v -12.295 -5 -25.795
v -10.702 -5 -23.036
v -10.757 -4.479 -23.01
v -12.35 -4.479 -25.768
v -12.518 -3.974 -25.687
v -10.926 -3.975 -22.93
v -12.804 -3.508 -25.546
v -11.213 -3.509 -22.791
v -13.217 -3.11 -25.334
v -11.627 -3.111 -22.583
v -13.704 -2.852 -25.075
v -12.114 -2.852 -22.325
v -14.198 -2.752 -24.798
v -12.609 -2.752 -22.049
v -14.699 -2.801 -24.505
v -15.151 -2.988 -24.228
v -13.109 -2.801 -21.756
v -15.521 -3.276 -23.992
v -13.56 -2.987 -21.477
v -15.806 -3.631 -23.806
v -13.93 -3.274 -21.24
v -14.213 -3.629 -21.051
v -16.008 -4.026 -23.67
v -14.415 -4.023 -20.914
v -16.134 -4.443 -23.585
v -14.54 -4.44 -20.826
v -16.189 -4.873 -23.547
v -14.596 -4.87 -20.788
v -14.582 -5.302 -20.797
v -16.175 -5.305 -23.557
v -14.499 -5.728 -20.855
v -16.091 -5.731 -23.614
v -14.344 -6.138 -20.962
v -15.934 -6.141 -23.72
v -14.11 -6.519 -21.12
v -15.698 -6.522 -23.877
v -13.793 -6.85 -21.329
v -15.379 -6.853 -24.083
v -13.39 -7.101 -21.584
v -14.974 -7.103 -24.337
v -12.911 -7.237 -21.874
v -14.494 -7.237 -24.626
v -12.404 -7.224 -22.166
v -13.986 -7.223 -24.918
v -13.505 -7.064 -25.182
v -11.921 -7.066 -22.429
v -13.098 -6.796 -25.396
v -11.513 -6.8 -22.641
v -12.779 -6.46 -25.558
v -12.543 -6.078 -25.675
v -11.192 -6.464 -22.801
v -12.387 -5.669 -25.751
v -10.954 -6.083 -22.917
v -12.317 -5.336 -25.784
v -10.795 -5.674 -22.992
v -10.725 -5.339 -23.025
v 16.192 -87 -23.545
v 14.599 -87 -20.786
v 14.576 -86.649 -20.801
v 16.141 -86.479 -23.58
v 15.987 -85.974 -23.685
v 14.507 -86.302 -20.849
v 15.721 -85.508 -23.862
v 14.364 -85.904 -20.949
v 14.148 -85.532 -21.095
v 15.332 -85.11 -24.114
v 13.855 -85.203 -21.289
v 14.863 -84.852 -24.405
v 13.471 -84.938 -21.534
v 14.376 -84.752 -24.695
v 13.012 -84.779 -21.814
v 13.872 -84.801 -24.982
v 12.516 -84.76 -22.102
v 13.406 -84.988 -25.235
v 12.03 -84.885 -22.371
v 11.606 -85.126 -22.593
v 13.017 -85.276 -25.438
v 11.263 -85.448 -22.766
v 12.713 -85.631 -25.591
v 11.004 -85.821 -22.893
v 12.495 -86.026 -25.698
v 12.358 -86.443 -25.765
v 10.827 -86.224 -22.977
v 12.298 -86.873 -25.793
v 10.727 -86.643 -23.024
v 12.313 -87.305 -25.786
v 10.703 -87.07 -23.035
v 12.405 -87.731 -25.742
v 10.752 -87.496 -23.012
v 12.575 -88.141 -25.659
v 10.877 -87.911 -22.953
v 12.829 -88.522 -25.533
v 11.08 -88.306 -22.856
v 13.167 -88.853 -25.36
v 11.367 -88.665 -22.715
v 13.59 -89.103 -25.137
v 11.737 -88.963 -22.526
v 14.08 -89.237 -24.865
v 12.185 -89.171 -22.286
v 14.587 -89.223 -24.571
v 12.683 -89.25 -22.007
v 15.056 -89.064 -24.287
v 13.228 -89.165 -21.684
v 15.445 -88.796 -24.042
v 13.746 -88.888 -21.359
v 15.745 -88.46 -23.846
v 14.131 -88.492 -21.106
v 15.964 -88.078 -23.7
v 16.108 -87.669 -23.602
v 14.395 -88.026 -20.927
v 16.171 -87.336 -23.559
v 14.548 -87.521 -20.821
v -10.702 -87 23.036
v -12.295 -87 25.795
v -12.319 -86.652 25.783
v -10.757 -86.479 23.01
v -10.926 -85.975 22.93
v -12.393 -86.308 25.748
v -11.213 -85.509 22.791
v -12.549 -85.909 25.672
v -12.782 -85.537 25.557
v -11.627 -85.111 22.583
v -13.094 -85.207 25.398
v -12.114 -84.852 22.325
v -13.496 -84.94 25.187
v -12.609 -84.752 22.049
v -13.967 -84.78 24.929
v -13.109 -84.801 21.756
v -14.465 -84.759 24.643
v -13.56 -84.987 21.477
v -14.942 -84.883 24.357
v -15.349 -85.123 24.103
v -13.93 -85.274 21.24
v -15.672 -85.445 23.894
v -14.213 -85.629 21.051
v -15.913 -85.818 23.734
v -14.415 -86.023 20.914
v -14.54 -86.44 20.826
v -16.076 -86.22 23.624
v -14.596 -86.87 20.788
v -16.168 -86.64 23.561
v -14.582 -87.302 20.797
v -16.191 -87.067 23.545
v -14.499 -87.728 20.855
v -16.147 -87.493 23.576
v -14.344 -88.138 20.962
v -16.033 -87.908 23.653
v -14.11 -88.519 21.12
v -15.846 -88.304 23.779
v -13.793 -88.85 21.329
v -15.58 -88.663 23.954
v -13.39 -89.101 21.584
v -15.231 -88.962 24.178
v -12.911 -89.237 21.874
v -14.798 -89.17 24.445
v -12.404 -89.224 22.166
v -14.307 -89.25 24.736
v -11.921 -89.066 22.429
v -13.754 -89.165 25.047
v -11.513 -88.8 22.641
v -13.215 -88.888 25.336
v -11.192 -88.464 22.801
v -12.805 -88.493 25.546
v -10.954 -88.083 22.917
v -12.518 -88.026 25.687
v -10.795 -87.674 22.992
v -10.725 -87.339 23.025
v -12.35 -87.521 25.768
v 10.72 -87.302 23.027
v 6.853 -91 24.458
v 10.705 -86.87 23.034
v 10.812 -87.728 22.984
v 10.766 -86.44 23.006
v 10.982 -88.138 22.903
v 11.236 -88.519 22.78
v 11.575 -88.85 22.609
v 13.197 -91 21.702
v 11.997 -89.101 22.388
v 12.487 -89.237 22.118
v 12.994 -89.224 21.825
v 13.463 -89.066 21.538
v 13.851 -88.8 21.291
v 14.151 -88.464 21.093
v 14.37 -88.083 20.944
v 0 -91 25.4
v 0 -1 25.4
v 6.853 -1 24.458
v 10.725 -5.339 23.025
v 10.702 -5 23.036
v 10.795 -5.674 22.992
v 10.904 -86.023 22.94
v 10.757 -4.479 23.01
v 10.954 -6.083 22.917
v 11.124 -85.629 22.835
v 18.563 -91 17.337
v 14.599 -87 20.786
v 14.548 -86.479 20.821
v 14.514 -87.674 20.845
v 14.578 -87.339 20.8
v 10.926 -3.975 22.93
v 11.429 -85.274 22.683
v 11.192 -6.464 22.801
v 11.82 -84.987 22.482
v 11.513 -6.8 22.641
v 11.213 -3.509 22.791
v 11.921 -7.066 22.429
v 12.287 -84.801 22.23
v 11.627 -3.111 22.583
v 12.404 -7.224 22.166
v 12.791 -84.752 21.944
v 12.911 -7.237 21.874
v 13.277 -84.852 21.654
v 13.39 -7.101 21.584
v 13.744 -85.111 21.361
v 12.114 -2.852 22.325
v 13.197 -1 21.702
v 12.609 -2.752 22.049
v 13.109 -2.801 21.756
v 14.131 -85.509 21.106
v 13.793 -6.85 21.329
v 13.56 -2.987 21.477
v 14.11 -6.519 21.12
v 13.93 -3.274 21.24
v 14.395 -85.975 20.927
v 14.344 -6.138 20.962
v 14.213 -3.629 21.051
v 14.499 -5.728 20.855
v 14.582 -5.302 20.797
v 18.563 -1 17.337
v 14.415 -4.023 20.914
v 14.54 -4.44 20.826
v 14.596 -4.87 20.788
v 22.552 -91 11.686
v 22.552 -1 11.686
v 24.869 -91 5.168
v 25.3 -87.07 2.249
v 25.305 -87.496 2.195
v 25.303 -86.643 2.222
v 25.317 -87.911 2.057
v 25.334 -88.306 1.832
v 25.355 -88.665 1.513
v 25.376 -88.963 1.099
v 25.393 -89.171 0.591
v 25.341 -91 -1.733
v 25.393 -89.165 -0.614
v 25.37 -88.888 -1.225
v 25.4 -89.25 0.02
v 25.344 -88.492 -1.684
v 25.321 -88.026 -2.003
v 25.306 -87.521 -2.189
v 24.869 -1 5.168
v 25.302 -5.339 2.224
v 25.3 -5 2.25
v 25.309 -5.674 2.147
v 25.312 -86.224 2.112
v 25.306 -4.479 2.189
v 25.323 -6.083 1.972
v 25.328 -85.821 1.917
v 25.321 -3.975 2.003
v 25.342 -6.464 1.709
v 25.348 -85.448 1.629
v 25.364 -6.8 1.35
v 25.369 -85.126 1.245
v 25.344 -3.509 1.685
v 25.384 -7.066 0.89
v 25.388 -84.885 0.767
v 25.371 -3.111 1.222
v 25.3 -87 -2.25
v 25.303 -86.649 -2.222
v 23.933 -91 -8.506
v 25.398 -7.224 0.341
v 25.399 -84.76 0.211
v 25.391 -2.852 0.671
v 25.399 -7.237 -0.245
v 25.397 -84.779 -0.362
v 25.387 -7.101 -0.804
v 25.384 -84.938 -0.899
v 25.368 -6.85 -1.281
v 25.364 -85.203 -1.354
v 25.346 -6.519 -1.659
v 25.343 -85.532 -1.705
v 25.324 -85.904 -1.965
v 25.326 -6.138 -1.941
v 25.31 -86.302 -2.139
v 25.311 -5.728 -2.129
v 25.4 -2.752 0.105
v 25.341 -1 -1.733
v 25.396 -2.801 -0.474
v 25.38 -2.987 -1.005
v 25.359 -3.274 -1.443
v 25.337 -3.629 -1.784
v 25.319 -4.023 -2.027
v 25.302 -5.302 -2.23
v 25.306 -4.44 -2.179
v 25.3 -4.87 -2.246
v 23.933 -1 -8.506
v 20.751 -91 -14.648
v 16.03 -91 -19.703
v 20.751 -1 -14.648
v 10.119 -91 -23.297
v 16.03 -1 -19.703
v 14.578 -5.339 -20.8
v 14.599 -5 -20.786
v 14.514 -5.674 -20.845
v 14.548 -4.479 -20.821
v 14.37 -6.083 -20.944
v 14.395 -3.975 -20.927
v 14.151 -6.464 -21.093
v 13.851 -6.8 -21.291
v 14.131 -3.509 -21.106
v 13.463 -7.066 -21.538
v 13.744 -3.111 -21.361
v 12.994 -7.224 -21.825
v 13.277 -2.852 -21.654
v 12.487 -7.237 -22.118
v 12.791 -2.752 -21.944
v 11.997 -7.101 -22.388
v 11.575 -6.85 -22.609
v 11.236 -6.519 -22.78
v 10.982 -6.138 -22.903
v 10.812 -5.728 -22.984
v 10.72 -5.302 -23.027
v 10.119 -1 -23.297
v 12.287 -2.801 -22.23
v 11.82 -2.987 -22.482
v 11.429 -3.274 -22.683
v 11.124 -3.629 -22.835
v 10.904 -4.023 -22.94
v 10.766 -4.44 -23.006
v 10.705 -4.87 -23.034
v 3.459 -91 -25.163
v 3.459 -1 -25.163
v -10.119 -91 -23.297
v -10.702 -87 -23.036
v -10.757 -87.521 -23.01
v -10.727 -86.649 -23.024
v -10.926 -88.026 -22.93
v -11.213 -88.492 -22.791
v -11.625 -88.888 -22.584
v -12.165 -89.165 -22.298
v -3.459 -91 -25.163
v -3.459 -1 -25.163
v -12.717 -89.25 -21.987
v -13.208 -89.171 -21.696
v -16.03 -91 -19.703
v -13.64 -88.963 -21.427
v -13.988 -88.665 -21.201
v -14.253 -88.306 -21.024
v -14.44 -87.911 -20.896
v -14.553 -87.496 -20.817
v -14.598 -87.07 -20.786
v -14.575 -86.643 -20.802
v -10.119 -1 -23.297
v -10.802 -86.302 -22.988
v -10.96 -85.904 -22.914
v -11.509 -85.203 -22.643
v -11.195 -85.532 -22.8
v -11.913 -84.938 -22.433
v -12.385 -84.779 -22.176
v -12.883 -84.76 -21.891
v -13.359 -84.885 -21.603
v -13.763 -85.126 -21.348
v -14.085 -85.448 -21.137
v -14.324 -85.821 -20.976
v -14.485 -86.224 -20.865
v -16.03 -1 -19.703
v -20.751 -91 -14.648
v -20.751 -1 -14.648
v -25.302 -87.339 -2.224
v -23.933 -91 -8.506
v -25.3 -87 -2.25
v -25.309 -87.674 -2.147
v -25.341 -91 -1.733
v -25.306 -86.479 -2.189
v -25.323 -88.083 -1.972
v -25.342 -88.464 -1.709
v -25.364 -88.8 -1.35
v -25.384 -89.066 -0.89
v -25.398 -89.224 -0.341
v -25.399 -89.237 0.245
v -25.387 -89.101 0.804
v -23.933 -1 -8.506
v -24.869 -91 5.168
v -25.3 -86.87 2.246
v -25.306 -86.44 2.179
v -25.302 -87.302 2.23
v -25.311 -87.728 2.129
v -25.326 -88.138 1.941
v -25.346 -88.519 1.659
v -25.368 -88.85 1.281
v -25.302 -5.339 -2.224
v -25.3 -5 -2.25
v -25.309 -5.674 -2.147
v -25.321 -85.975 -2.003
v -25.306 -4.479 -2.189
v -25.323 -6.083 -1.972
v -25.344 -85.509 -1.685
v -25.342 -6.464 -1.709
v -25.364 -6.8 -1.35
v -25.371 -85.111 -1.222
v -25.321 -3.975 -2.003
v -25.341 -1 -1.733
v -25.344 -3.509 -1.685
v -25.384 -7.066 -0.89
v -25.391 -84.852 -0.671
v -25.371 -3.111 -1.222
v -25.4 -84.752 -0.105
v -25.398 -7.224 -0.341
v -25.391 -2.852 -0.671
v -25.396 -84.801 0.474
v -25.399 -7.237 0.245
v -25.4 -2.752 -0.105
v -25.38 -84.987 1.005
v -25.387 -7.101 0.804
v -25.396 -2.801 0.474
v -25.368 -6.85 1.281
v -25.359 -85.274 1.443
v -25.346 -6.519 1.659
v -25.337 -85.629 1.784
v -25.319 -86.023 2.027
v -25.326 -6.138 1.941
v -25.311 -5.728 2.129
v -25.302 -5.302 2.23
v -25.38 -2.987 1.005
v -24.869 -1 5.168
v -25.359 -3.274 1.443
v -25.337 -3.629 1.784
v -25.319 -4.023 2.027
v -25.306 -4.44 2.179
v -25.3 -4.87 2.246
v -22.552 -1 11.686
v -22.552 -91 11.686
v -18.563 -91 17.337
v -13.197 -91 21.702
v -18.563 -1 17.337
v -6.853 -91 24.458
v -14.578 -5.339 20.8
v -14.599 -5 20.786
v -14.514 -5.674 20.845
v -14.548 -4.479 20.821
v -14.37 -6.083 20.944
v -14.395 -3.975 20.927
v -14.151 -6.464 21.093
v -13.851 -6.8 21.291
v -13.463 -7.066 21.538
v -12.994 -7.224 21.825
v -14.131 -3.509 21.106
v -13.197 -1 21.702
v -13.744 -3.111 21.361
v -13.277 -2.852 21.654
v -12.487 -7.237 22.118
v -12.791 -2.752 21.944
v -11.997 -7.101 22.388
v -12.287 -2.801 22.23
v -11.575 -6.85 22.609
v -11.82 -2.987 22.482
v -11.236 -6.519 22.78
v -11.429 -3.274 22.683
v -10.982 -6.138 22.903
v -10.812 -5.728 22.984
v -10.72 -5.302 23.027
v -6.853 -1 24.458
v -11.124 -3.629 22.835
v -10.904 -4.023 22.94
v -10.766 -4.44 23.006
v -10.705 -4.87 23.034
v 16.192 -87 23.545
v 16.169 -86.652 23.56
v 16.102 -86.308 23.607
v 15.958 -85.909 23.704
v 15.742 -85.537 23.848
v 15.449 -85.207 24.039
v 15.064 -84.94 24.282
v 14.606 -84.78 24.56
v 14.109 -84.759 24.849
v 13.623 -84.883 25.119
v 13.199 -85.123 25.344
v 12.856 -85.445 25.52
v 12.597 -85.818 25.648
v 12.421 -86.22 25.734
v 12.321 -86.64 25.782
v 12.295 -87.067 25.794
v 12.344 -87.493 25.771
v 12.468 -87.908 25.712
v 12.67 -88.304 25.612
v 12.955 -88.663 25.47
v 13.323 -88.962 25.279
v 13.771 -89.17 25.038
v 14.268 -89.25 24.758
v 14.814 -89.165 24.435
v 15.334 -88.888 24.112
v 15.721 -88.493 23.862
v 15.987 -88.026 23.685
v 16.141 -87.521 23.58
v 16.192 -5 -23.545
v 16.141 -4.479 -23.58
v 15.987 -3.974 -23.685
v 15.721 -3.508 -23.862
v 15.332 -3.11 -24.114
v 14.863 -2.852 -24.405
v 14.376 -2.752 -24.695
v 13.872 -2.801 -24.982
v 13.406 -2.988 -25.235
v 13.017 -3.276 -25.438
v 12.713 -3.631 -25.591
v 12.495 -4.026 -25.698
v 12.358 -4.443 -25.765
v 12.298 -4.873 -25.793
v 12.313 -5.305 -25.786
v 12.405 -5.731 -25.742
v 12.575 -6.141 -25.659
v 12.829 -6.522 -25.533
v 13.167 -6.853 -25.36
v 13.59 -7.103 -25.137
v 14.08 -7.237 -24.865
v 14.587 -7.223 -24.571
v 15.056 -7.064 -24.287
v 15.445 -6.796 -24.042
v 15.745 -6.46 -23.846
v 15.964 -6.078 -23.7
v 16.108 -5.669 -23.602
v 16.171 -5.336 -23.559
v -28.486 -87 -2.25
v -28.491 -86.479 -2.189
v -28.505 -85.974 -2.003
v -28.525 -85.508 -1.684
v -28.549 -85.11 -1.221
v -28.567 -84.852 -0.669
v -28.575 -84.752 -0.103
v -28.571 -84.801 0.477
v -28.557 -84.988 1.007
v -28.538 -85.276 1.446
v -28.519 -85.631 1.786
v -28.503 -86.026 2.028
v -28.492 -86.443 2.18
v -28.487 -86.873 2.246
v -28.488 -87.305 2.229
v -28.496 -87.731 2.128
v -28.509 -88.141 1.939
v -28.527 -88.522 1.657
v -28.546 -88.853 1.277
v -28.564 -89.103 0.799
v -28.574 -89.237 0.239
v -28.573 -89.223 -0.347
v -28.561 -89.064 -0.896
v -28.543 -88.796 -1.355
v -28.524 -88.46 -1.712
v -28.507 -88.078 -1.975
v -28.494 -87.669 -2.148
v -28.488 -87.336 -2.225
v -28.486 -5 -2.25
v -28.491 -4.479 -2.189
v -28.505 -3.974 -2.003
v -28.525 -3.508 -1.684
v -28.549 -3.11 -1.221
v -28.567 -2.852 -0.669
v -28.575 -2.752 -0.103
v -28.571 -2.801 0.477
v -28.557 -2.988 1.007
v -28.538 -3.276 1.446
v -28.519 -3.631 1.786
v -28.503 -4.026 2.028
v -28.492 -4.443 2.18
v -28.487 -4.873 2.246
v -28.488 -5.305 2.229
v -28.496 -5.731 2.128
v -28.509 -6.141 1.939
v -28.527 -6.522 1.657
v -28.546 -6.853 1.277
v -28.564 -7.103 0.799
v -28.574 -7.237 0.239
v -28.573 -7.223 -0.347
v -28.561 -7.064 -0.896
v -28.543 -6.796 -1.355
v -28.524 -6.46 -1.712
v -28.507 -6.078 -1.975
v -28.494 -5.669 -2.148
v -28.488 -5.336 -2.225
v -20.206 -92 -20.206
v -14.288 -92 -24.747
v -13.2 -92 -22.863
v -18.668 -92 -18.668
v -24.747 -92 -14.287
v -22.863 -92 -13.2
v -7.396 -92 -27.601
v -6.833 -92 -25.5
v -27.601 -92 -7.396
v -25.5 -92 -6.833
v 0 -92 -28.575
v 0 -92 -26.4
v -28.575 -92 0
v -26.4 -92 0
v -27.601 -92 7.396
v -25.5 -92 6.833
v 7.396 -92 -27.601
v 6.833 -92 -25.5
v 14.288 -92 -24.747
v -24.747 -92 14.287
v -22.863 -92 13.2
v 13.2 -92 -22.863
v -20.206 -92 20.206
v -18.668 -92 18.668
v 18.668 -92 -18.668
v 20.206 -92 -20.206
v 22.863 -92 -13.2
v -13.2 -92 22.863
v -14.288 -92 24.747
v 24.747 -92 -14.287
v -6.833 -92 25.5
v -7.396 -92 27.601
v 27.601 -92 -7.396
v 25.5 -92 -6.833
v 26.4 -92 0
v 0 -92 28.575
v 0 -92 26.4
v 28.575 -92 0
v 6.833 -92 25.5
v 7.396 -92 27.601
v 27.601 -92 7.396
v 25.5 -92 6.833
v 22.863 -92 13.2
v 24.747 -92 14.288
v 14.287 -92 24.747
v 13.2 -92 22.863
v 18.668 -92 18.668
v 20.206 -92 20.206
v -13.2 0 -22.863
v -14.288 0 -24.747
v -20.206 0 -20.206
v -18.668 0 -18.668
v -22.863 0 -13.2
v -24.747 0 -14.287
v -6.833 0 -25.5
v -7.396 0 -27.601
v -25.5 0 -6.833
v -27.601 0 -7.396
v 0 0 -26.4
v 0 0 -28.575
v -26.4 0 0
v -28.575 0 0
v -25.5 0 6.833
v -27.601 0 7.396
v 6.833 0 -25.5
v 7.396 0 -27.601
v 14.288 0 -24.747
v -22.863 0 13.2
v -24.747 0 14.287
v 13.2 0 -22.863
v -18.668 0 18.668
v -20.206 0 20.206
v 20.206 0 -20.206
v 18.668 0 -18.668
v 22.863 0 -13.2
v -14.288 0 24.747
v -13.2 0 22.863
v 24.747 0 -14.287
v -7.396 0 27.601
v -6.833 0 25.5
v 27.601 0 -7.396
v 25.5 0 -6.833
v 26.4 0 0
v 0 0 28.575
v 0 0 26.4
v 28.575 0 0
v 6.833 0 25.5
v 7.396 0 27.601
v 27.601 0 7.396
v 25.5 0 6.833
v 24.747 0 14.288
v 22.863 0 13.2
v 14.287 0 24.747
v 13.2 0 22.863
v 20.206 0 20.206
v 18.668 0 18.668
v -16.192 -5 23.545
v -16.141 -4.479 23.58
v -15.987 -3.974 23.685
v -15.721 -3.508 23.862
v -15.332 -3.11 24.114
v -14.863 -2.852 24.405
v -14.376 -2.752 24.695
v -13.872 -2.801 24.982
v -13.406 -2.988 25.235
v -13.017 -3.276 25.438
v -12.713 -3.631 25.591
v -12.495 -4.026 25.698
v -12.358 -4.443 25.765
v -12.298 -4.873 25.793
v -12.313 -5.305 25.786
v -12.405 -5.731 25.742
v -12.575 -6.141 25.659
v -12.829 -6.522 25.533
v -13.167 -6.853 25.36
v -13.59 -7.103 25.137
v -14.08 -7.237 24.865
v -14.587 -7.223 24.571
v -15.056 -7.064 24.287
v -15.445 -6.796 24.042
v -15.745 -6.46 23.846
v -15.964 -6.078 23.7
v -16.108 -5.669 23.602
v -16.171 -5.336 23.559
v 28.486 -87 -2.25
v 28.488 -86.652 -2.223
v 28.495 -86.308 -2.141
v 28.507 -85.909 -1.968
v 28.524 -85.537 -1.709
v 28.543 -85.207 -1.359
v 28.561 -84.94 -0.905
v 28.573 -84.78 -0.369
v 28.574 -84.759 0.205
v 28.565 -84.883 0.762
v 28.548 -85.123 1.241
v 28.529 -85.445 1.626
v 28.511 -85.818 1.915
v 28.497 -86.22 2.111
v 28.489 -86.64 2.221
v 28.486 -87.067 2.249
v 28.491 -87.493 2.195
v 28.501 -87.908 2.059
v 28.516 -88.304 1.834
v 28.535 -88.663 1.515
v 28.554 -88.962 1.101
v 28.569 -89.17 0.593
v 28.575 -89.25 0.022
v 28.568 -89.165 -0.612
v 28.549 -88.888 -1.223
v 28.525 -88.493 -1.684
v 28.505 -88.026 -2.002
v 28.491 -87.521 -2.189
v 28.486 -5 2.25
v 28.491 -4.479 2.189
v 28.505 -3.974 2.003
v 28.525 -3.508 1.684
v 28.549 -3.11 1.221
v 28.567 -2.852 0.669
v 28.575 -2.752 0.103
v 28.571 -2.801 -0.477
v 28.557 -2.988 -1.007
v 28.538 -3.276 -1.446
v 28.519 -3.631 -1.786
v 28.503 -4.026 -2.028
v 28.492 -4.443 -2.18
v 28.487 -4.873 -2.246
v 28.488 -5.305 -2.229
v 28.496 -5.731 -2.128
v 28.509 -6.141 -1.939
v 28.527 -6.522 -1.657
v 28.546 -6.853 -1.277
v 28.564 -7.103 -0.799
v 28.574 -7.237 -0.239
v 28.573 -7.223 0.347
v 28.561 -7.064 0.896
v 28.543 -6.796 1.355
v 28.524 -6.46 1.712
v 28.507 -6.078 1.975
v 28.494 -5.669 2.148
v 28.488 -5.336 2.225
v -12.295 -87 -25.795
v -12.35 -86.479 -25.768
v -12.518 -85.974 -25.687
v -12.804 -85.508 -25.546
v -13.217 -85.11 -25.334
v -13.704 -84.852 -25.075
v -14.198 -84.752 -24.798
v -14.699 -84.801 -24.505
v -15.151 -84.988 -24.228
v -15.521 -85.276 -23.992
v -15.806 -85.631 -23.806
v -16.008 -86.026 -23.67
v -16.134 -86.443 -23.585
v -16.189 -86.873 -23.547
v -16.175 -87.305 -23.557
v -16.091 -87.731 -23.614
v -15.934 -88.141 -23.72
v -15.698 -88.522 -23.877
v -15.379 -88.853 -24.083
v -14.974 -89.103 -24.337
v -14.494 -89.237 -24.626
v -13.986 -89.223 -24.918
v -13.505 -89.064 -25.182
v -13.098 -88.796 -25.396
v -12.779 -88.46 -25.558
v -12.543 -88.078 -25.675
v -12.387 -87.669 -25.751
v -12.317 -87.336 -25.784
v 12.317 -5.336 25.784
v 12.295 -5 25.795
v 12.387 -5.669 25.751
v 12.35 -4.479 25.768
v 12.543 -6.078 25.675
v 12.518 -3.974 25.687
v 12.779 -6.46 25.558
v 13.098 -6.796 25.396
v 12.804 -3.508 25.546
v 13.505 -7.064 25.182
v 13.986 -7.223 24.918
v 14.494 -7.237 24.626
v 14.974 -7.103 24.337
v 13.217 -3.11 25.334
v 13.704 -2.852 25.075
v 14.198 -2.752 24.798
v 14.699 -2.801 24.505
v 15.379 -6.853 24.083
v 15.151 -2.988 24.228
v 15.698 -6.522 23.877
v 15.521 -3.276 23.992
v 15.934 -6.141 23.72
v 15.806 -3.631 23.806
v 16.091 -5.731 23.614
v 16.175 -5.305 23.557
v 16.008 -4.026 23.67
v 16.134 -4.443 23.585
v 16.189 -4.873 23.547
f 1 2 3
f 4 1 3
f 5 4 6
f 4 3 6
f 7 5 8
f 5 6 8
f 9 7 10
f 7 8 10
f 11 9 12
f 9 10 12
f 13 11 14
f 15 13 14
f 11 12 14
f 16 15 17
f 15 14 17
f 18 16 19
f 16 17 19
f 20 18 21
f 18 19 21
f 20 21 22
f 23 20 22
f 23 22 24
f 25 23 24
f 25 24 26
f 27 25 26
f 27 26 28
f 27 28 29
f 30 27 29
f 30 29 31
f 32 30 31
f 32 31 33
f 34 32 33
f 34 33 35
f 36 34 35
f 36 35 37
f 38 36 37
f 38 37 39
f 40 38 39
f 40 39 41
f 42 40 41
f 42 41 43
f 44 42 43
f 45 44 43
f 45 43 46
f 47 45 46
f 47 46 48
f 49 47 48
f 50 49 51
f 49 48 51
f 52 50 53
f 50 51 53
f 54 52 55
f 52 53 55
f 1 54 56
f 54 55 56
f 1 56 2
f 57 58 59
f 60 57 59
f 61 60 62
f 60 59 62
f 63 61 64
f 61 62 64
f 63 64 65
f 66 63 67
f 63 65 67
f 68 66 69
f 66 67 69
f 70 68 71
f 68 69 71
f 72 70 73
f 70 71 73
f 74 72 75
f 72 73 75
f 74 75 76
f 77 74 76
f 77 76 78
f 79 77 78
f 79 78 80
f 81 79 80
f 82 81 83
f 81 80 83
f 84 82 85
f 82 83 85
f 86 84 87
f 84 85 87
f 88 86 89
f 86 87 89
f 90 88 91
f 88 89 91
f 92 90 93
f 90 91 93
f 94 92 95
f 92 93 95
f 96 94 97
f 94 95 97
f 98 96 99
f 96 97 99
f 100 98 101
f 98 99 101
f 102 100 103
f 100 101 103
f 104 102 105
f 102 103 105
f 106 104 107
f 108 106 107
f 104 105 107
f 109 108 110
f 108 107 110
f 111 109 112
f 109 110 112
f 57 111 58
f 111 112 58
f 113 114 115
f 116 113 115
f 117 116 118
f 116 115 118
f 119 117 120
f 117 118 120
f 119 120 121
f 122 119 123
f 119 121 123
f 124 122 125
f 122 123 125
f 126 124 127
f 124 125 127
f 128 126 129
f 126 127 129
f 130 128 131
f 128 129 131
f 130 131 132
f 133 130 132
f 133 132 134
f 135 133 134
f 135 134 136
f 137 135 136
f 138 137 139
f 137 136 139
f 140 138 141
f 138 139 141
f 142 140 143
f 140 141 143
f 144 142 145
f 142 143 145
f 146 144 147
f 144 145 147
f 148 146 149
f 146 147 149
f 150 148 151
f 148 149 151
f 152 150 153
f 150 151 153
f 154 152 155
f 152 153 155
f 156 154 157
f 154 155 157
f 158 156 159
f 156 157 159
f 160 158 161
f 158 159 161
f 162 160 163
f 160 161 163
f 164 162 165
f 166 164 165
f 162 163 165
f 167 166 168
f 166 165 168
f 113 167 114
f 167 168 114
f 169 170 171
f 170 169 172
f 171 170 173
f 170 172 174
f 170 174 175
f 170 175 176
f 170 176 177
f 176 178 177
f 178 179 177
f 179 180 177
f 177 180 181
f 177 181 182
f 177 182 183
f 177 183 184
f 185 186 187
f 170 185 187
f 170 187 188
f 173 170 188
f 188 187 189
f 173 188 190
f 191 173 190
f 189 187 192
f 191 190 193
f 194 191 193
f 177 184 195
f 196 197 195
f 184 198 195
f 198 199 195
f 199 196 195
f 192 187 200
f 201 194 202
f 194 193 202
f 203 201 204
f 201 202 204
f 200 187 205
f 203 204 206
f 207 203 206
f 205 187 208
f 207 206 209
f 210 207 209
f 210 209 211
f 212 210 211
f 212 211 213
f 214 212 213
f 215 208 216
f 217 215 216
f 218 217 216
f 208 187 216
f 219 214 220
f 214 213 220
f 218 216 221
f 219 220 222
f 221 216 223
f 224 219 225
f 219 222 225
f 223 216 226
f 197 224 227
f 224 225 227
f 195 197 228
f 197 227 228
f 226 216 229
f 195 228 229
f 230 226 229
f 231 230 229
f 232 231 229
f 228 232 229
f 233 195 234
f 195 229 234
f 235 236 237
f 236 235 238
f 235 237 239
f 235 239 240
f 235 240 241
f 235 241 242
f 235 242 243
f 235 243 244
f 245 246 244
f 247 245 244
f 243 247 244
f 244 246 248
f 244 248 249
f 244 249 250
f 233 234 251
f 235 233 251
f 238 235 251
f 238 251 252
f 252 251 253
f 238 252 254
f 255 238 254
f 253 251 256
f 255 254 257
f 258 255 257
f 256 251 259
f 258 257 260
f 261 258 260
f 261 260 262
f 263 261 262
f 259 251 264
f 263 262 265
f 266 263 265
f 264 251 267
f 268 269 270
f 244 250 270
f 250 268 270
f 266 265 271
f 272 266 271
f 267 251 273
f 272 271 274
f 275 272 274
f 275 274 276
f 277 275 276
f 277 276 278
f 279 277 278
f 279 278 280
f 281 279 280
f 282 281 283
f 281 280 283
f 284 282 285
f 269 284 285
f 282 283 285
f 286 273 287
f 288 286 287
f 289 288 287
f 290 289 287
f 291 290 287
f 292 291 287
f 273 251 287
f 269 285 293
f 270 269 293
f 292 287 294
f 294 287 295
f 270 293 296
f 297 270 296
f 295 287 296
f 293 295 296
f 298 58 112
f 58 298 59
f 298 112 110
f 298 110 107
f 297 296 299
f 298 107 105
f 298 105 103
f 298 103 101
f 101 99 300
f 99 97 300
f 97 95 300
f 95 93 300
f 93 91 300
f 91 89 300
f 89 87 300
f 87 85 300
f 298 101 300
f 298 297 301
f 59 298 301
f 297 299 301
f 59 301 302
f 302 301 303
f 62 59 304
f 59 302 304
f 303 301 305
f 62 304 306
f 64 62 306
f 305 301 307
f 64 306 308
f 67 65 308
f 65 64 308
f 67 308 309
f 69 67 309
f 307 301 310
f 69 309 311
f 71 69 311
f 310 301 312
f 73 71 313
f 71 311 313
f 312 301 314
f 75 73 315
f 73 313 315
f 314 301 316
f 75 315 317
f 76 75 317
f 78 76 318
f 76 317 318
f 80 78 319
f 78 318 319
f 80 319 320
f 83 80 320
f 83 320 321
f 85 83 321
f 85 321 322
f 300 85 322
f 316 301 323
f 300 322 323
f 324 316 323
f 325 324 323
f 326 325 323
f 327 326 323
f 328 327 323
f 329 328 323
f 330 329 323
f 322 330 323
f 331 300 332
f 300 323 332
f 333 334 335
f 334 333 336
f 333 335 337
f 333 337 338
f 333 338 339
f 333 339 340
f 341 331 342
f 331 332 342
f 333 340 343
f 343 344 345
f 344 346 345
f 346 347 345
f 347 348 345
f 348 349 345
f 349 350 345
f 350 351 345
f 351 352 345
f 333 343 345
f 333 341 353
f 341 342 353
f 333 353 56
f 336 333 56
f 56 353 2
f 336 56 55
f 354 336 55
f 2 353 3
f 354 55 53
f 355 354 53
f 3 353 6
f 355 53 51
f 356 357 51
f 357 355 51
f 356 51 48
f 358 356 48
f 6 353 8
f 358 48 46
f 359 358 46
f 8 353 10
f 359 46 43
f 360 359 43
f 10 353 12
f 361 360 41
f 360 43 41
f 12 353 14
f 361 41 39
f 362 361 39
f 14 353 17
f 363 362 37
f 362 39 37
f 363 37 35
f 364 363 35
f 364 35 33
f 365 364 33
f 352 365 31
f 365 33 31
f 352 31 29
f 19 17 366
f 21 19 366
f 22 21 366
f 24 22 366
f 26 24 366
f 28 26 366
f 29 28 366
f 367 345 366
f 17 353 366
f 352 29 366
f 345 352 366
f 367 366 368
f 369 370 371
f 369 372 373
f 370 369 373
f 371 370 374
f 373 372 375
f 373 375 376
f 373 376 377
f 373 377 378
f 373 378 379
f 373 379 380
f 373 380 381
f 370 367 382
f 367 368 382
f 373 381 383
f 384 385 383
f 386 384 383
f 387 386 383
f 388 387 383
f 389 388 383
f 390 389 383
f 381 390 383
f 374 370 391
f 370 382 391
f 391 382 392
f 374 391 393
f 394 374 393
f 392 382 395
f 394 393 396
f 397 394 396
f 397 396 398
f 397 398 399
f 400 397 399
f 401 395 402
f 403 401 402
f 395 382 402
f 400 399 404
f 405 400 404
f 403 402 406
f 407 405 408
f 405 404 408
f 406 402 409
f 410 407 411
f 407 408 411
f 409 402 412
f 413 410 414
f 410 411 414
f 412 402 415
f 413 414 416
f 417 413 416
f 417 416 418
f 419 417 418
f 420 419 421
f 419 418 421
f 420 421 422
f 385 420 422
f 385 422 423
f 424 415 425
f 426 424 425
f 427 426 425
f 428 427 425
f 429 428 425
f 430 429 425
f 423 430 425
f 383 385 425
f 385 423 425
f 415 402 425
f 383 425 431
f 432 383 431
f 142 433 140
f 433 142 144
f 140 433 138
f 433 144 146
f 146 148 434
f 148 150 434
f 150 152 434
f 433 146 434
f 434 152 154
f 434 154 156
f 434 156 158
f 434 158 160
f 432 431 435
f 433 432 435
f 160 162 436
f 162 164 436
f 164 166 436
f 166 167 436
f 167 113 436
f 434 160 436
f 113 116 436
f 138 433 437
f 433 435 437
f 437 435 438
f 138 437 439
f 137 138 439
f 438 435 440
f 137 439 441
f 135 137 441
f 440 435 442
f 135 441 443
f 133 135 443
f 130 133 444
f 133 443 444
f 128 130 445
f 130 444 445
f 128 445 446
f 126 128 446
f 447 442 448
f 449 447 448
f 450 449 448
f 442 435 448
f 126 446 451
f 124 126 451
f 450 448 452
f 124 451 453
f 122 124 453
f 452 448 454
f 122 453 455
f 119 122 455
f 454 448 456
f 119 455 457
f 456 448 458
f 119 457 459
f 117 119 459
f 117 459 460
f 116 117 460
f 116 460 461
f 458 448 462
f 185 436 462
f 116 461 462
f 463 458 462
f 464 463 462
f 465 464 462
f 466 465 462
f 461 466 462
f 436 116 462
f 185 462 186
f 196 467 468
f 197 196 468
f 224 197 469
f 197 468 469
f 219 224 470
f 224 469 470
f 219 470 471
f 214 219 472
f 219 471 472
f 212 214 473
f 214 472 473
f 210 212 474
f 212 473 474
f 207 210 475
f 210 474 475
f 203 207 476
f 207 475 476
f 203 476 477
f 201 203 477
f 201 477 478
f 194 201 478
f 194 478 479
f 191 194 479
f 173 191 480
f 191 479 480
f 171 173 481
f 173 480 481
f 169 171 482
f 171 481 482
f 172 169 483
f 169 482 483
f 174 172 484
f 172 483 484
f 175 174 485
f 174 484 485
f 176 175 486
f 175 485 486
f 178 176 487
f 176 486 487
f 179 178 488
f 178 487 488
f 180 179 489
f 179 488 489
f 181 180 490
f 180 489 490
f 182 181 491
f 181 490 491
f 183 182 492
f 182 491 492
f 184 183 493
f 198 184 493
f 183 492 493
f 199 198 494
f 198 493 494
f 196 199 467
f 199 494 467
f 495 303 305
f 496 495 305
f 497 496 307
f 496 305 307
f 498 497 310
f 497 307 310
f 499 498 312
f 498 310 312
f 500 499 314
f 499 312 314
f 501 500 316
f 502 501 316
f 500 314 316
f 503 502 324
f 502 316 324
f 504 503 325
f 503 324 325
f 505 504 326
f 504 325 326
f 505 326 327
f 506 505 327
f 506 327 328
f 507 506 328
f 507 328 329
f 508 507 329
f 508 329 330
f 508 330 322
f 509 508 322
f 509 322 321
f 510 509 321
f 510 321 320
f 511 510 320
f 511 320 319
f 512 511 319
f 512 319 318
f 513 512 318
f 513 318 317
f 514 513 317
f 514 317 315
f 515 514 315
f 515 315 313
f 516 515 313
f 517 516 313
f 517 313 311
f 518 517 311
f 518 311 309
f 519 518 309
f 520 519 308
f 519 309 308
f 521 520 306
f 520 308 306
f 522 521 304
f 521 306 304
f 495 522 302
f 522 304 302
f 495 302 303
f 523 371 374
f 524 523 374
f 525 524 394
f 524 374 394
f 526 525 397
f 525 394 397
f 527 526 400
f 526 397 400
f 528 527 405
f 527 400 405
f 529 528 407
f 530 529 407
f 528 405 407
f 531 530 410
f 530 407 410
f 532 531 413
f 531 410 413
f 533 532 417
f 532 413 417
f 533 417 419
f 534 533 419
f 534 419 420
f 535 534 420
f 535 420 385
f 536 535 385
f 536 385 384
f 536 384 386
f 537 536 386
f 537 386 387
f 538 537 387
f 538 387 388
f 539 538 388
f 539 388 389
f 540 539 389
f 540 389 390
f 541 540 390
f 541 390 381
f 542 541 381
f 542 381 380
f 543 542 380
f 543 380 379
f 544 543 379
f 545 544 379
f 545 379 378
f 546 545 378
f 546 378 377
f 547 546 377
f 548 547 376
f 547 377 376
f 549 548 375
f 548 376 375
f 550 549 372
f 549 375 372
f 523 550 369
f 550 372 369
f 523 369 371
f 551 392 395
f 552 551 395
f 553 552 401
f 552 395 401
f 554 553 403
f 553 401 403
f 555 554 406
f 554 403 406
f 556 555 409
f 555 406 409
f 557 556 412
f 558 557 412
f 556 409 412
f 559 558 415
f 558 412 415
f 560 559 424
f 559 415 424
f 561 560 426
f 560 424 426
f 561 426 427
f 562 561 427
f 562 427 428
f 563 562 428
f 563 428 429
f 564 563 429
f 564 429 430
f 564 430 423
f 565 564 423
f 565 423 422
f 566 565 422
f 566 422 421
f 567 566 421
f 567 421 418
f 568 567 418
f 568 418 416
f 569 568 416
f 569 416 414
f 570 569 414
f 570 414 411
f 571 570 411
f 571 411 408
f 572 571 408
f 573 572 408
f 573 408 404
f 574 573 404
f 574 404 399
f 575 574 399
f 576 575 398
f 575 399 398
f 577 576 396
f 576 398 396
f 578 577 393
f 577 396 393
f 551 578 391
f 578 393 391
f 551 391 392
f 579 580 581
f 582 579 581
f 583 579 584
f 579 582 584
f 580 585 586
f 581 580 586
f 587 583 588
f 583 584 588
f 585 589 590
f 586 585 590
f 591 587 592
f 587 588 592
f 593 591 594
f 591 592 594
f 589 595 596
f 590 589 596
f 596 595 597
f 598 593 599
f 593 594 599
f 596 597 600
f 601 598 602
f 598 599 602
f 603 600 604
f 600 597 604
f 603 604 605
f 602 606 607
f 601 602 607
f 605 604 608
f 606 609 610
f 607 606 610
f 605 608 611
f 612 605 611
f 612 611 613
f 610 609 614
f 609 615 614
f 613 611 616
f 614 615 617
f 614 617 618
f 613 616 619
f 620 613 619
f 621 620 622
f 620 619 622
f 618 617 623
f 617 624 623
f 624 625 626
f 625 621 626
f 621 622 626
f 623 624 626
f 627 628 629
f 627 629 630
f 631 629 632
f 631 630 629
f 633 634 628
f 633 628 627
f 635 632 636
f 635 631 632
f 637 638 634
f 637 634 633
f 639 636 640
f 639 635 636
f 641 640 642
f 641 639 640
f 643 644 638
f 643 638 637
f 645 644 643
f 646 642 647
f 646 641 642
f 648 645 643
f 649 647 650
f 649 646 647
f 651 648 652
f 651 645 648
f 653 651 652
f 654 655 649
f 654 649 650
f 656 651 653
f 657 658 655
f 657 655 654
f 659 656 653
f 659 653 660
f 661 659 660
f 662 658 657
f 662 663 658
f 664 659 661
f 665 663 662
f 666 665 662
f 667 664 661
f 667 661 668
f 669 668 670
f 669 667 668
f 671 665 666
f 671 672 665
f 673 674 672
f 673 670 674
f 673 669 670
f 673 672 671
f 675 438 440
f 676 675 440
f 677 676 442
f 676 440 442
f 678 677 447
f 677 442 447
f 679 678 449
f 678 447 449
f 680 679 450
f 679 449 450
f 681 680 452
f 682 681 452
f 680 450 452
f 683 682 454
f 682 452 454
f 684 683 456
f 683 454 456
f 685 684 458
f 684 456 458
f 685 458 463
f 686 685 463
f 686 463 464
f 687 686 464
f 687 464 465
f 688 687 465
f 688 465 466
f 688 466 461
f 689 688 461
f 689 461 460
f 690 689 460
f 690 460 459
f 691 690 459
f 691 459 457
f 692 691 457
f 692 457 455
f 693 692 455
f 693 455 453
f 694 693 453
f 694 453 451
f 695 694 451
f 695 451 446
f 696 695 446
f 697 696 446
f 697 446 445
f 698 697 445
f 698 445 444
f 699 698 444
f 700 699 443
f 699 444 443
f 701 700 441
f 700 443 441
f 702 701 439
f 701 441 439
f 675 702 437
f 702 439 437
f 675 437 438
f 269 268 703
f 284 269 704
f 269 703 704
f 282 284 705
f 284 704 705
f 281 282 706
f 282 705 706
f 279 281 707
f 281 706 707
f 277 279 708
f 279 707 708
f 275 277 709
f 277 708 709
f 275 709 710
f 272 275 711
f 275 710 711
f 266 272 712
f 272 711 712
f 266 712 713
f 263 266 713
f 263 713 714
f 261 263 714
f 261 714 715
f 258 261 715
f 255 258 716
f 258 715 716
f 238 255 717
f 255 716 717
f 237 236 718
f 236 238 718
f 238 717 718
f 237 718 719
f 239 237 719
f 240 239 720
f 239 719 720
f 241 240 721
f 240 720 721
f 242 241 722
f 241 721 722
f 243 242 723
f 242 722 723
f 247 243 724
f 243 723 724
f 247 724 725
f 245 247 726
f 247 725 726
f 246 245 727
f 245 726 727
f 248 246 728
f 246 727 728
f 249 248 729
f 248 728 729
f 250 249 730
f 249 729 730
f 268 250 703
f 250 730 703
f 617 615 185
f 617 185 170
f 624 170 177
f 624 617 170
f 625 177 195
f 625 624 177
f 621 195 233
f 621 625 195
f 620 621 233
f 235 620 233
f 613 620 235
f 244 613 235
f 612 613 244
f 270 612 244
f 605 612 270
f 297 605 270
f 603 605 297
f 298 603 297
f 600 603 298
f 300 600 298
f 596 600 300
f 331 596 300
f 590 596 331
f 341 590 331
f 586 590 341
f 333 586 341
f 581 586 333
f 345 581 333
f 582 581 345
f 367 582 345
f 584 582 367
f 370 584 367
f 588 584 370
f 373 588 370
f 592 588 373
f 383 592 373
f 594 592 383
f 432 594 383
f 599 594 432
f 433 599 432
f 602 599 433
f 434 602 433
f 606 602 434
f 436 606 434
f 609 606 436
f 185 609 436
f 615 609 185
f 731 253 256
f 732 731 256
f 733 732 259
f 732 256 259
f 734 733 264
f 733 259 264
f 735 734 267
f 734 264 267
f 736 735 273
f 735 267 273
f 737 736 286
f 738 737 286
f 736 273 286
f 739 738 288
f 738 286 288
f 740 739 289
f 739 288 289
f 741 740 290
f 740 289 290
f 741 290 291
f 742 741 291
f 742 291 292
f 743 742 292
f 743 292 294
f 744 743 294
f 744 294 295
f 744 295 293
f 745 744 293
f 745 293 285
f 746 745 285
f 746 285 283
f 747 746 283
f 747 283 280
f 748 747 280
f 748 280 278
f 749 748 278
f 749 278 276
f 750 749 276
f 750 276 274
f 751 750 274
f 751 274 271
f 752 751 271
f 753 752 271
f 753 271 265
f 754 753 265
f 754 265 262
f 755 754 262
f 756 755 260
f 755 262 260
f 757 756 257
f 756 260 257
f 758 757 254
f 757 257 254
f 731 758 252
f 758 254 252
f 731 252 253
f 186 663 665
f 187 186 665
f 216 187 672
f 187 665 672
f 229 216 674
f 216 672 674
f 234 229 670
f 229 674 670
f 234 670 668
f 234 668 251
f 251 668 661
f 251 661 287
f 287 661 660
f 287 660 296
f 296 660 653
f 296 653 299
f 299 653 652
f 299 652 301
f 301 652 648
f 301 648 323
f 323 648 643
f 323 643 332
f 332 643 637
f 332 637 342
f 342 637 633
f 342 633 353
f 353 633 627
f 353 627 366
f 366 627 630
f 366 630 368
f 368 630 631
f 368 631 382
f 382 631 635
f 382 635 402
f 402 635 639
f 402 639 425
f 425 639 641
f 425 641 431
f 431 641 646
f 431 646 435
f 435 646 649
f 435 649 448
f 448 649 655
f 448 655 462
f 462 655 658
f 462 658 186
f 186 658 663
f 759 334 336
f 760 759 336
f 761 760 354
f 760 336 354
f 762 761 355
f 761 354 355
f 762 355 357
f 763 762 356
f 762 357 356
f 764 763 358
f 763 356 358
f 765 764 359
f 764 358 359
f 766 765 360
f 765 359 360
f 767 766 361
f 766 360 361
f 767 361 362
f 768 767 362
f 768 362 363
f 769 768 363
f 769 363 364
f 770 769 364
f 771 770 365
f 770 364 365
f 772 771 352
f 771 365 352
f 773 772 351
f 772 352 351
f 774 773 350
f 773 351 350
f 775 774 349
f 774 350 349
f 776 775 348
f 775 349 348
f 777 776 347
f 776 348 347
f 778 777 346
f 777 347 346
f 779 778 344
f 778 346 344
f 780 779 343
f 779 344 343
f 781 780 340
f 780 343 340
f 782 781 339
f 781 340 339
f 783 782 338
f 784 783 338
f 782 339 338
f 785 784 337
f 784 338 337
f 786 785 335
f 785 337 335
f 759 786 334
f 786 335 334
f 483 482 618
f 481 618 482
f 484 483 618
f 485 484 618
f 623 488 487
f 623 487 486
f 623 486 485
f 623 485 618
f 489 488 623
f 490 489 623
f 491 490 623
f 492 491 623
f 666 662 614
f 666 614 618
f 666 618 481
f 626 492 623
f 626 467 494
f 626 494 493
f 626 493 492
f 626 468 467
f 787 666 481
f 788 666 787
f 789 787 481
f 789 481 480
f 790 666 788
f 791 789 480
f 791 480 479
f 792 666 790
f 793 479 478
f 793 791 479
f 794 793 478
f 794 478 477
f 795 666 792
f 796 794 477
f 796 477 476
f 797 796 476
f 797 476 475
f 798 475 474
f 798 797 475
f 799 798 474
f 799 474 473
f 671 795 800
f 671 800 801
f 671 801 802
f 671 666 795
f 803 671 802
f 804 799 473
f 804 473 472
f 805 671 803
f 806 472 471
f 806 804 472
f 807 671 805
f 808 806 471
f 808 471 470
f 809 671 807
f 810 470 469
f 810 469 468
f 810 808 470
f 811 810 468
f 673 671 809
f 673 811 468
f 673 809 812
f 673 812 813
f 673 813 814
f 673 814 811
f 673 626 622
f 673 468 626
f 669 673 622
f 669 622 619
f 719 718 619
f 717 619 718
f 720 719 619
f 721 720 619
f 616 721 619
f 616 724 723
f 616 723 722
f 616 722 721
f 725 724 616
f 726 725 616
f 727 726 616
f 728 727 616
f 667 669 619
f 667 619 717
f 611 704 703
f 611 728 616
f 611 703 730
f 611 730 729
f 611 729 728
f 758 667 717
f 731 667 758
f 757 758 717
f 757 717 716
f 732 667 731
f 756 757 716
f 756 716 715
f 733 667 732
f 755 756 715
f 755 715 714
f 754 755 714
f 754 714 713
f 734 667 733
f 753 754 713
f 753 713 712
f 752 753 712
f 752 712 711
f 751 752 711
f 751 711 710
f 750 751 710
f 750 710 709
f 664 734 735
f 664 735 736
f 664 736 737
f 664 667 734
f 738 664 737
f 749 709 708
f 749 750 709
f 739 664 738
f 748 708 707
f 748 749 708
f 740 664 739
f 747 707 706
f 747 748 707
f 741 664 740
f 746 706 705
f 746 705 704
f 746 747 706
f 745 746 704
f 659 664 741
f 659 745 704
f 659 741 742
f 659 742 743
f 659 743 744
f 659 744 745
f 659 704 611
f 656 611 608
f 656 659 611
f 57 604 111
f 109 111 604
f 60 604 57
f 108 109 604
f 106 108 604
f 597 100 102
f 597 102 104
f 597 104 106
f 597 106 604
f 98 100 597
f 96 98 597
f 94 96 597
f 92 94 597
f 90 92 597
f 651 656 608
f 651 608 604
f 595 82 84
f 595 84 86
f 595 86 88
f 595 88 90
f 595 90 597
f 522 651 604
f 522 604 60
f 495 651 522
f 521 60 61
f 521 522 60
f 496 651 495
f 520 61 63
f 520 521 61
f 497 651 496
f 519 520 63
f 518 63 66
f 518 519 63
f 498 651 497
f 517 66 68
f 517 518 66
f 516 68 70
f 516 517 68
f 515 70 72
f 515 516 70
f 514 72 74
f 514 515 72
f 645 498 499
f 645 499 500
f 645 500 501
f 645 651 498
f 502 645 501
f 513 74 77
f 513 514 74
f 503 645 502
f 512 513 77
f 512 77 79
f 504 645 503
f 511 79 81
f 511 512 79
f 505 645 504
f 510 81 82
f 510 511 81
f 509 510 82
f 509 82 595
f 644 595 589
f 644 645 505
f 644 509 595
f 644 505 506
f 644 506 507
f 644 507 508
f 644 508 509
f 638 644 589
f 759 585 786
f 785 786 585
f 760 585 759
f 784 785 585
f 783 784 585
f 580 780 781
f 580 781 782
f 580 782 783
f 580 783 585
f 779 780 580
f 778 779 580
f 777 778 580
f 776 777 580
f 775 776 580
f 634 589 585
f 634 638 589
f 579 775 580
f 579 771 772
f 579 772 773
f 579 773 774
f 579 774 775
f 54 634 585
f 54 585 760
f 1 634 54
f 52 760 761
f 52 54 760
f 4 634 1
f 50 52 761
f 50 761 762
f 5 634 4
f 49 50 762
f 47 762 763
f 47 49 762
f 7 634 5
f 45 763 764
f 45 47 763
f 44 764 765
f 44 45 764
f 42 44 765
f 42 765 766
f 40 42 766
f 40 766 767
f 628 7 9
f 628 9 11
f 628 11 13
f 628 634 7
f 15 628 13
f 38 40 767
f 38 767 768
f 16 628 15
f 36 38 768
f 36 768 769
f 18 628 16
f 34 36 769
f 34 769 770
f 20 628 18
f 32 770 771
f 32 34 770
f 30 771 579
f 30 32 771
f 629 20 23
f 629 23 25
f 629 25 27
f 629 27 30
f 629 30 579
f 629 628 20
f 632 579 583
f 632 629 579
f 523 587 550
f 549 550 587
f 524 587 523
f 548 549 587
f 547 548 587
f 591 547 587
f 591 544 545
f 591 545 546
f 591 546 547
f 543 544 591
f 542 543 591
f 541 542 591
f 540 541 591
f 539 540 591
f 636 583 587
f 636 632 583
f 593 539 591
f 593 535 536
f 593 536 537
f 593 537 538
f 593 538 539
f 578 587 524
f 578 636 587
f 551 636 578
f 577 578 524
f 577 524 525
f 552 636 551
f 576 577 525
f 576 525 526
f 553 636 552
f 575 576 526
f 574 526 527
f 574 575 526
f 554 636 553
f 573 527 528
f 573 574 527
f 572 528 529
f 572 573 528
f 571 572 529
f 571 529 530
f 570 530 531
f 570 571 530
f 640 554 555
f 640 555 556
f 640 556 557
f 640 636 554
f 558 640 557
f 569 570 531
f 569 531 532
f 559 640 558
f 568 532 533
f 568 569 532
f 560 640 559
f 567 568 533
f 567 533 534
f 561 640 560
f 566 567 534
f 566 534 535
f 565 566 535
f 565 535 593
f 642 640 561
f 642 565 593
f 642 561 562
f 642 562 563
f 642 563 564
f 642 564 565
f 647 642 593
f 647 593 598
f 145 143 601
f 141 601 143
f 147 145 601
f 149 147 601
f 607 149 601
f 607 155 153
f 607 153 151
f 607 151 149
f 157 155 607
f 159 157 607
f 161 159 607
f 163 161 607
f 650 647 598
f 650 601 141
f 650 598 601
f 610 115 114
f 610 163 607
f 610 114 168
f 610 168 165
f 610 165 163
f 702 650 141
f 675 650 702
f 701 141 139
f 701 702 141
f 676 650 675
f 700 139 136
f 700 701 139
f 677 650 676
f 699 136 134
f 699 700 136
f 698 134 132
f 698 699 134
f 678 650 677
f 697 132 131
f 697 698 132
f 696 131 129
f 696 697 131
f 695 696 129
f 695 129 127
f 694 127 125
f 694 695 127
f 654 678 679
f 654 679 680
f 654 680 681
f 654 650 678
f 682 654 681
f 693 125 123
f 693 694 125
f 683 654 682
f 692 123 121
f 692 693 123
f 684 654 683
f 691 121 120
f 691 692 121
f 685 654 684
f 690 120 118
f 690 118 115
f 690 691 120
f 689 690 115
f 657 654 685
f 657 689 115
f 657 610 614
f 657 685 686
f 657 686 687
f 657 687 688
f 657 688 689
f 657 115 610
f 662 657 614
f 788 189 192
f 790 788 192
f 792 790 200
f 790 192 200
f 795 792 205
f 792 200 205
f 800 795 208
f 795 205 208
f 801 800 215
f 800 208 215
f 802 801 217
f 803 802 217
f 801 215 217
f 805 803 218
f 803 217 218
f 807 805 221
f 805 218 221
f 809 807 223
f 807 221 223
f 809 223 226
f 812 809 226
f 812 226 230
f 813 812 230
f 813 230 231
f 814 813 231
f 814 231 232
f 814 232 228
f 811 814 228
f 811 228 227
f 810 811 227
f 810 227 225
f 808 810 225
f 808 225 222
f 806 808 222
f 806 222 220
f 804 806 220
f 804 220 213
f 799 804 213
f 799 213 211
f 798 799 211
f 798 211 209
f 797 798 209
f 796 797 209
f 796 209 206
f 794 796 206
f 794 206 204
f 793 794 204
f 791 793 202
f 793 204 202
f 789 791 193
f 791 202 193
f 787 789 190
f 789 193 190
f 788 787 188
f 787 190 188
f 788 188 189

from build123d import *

# Parameters (mm, degrees)
SKETCH2_R           = 28.575
BOSS_EXTRUDE1_DEPTH = 92
SKETCH3_R           = 25.4
CUT_EXTRUDE1_DEPTH  = 110
SKETCH7_R           = 2.25
CUT_EXTRUDE2_DEPTH  = 110
CIRPATTERN1_COUNT   = 6
SKETCH8_R           = 2.25
CUT_EXTRUDE5_DEPTH  = 101.484134476
CIRPATTERN2_COUNT   = 6
CHAMFER1_SIZE       = 1


with BuildPart() as part:
    # Sketch2 → Boss-Extrude1 (new body)
    with BuildSketch(Plane(origin=(0, 0, 0), x_dir=(1, 0, 0), z_dir=(0, 1, 0))):
        with Locations(Location((0, 0, 0), (0, 0, 270))):
            Circle(SKETCH2_R)
    extrude(amount=-BOSS_EXTRUDE1_DEPTH)

    # Sketch3 → Cut-Extrude1 (cut)
    with BuildSketch(Plane(origin=(0, 0, 0), x_dir=(1, 0, 0), z_dir=(0, 1, 0))):
        with Locations(Location((0, 0, 0), (0, 0, 270))):
            Circle(SKETCH3_R)
    extrude(amount=-CUT_EXTRUDE1_DEPTH, mode=Mode.SUBTRACT)

    # Sketch7 → Cut-Extrude2 (cut)
    with BuildSketch(Plane(origin=(0, 0, 0), x_dir=(0, 0, -1), z_dir=(1, 0, 0))):
        with Locations((0, -5)):
            Circle(SKETCH7_R)
    cut_extrude2 = extrude(amount=-CUT_EXTRUDE2_DEPTH, mode=Mode.SUBTRACT)

    # CirPattern1: Cut-Extrude2 ×6 about axis
    cirpattern1_axis = Axis((0, 0, 0), (0, -1, 0))
    for i in range(1, CIRPATTERN1_COUNT):
        add(cut_extrude2.rotate(cirpattern1_axis, i * 360 / CIRPATTERN1_COUNT), mode=Mode.SUBTRACT)

    # Sketch8 → Cut-Extrude5 (cut, symmetric)
    with BuildSketch(Plane(origin=(0, 0, 0), x_dir=(0, 0, -1), z_dir=(1, 0, 0))):
        with Locations((0, -87)):
            Circle(SKETCH8_R)
    cut_extrude5 = extrude(amount=CUT_EXTRUDE5_DEPTH, both=True, mode=Mode.SUBTRACT)

    # CirPattern2: Cut-Extrude5 ×6 about axis
    cirpattern2_axis = Axis((0, 0, 0), (0, -1, 0))
    for i in range(1, CIRPATTERN2_COUNT):
        add(cut_extrude5.rotate(cirpattern2_axis, i * 360 / CIRPATTERN2_COUNT), mode=Mode.SUBTRACT)

    # Chamfer1
    chamfer1_edges = [part.edges().sort_by_distance(p)[0] for p in [
        (0, -92, -25.4),
        (0, 0, -25.4),
    ]]
    chamfer(chamfer1_edges, length=CHAMFER1_SIZE)


solid = part.part
